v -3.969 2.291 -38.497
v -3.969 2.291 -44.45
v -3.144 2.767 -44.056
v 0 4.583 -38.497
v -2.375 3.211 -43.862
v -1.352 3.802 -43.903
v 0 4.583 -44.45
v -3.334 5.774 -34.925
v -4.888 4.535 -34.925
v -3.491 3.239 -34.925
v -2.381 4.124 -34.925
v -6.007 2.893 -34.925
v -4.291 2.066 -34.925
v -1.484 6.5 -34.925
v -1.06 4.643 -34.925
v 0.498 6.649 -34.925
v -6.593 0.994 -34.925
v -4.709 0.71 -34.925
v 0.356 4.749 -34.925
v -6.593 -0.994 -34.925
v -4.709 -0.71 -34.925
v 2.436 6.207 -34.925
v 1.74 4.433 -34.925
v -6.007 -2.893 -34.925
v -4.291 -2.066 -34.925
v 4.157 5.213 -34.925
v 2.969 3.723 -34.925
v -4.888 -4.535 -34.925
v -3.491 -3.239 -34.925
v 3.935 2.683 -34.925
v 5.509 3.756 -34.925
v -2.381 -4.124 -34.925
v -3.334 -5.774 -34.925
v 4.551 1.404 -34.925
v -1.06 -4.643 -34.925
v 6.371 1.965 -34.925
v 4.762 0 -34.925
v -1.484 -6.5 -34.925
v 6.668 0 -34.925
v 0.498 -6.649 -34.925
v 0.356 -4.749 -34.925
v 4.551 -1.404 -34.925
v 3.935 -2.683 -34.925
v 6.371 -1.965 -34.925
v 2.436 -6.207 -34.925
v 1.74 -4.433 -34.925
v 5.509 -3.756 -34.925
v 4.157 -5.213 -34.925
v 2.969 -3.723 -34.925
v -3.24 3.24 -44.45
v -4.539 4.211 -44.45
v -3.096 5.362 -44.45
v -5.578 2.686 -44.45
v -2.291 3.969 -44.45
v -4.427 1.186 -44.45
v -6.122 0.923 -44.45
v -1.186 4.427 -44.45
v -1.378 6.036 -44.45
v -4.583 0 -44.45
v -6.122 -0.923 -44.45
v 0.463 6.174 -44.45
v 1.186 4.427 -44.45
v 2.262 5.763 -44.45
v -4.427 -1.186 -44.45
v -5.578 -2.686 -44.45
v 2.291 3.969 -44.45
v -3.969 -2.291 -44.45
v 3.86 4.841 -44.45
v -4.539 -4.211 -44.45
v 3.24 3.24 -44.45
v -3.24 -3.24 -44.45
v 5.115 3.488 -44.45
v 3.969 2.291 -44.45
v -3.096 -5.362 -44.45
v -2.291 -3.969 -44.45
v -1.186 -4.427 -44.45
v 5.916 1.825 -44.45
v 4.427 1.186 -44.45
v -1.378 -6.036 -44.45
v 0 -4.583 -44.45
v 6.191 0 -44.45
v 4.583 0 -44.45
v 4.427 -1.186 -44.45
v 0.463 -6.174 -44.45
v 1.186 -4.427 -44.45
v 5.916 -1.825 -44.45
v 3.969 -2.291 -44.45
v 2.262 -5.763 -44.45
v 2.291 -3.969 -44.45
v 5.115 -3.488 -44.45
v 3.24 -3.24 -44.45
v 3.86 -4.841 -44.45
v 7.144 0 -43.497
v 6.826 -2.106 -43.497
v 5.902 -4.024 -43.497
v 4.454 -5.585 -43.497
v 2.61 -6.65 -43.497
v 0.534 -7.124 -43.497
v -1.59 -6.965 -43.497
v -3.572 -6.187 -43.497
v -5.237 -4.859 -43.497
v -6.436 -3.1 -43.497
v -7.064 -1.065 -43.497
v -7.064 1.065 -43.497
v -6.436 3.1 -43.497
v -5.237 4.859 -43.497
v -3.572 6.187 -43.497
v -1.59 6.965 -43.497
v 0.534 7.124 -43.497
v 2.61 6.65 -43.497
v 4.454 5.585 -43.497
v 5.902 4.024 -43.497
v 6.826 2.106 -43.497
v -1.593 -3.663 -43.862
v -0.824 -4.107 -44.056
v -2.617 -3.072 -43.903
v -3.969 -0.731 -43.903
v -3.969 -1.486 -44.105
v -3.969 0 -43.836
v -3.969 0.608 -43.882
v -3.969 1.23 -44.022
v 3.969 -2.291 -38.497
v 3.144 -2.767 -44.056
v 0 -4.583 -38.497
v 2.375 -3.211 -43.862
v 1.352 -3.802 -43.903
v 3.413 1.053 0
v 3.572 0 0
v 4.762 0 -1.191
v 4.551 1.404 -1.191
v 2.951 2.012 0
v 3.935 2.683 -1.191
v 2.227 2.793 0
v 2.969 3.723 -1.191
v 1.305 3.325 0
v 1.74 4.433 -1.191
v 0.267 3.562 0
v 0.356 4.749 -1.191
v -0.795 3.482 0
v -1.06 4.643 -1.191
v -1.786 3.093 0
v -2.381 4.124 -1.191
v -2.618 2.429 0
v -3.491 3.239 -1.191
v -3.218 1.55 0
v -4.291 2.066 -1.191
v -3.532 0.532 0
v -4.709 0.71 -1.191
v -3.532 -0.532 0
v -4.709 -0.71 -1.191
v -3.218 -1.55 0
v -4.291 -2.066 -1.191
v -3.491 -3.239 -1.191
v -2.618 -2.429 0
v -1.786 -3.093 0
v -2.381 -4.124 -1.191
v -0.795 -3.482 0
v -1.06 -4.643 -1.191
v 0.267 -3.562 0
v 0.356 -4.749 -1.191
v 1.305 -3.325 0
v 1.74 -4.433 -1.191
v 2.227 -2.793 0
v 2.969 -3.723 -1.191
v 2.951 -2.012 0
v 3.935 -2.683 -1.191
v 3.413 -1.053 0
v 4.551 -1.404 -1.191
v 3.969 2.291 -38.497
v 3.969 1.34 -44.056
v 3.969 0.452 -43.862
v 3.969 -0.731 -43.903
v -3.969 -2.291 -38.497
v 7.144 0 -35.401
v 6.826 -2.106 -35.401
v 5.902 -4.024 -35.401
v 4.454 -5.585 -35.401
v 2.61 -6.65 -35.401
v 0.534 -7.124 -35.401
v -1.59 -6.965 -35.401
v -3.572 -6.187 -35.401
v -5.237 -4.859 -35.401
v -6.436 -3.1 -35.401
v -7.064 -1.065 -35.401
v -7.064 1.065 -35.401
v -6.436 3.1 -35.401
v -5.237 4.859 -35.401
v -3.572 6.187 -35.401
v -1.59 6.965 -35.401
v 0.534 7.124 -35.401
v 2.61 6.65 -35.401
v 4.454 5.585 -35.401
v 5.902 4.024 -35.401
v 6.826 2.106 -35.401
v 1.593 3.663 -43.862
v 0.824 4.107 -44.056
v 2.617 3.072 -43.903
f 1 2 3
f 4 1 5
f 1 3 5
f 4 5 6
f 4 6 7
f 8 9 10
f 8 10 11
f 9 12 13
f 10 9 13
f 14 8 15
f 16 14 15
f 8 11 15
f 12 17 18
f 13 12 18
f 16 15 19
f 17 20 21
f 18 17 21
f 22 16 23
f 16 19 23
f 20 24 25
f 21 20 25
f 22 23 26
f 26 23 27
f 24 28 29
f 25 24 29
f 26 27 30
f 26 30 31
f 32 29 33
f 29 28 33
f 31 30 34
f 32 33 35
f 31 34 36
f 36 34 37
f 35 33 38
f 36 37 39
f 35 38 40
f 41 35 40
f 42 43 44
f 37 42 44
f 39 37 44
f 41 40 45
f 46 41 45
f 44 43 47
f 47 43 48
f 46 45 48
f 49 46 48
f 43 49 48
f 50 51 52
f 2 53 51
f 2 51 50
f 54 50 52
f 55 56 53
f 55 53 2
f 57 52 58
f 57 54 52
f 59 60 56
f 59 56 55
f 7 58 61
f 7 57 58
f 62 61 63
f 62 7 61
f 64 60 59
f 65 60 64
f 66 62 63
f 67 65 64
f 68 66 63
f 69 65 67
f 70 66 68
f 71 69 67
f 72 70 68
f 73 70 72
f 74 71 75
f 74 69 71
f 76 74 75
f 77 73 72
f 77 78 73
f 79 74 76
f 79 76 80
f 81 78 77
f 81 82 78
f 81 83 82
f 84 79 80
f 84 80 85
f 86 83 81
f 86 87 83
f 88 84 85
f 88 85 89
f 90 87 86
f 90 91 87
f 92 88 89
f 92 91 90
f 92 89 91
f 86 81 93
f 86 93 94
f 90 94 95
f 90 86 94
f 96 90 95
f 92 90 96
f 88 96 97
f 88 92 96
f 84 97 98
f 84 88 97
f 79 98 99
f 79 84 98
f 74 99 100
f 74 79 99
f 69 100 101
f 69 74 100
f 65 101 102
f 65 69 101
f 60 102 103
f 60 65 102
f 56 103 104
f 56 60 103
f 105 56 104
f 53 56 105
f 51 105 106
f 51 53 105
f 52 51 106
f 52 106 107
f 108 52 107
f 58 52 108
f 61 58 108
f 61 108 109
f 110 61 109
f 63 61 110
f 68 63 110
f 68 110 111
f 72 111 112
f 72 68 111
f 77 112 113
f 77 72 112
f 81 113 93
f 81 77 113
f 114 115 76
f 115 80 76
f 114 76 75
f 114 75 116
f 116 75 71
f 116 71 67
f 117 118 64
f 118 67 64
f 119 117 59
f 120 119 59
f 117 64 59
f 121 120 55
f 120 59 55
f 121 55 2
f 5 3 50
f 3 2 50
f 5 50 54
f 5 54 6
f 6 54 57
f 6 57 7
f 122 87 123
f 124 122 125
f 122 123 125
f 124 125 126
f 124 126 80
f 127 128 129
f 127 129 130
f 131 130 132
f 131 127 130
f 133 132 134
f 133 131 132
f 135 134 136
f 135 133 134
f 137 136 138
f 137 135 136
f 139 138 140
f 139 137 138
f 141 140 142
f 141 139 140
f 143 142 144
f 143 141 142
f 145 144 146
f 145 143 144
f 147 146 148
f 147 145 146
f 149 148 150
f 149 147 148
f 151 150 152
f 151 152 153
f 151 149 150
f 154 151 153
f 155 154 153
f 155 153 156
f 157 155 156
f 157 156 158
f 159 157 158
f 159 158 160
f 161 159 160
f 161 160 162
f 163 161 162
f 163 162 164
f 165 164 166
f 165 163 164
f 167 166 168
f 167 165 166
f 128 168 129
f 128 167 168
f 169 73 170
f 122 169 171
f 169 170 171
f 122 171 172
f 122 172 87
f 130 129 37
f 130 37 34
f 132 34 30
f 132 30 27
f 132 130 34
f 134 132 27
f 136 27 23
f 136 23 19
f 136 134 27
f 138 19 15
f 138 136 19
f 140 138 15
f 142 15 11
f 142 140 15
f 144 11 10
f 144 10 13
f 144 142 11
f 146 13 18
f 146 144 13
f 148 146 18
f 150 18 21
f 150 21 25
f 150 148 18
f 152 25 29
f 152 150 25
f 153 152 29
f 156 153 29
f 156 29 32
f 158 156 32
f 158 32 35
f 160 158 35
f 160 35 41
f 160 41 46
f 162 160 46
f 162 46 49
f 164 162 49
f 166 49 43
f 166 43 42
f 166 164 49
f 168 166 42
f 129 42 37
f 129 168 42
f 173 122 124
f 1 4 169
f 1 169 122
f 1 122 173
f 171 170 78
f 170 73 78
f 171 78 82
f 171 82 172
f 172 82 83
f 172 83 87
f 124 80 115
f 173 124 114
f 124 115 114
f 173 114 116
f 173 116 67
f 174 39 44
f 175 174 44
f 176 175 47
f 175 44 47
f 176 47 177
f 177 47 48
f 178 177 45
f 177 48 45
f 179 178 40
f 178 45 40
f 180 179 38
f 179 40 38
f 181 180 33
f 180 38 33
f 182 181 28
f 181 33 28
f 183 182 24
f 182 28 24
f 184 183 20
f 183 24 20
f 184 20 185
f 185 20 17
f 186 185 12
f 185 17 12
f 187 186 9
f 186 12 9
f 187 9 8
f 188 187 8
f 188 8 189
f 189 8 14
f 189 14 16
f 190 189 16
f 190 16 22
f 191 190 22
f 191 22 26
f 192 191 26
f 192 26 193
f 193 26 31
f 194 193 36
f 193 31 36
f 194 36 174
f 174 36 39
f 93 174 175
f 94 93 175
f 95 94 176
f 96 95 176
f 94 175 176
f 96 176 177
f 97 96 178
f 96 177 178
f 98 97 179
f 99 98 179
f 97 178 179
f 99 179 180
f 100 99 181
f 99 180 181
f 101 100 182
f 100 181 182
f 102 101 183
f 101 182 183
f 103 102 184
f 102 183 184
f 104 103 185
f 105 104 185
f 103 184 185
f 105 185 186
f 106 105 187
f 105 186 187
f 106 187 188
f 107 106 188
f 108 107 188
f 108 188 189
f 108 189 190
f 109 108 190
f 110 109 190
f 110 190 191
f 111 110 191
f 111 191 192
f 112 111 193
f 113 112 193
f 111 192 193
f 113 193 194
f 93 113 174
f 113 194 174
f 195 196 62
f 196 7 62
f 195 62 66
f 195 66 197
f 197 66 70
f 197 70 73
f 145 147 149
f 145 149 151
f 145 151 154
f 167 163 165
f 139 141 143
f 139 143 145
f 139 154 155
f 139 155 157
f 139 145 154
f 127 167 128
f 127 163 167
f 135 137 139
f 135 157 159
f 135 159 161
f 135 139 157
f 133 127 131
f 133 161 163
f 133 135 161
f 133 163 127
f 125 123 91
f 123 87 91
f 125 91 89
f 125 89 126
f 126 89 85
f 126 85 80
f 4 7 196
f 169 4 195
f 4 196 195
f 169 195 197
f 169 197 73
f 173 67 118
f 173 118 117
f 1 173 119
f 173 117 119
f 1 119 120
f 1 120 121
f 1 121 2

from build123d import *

# Parameters (mm, degrees)
SKETCH1_R          = 4.7625
EXTRUDE1_DEPTH     = 34.925
SKETCH6_R          = 7.14375
EXTRUDE2_DEPTH     = 9.525
CUT_EXTRUDE1_DEPTH = 5.953125
SKETCH8_R          = 4.582717762
CUT_EXTRUDE2_DEPTH = 0.9525
CUT_EXTRUDE2_DRAFT = -45
CHAMFER1_SIZE      = 0.9525
CHAMFER2_SIZE      = 0.47625
CHAMFER3_SIZE      = 1.190625


with BuildPart() as part:
    # Sketch1 → Extrude1 (new body)
    with BuildSketch(Plane.XY):
        Circle(SKETCH1_R)
    extrude(amount=-EXTRUDE1_DEPTH)

    # Sketch6 → Extrude2 (add)
    with BuildSketch(Plane(origin=(0, 0, -34.925), x_dir=(-1, 0, 0), z_dir=(0, 0, -1))):
        with Locations(Location((0, 0, 0), (0, 0, 180))):
            Circle(SKETCH6_R)
    extrude(amount=EXTRUDE2_DEPTH)

    # Sketch7 → Cut-Extrude1 (cut)
    with BuildSketch(Plane(origin=(0, 0, -44.45), x_dir=(-1, 0, 0), z_dir=(0, 0, -1))):
        Polygon((0, 4.582717762), (-3.96875, 2.291358881), (-3.96875, -2.291358881), (0, -4.582717762), (3.96875, -2.291358881), (3.96875, 2.291358881), align=None)
    extrude(amount=-CUT_EXTRUDE1_DEPTH, mode=Mode.SUBTRACT)


with BuildPart() as cut_extrude2_tool:
    # Sketch8 → Cut-Extrude2 (with draft: the straight prism first)
    with BuildSketch(Plane(origin=(0, 0, -44.45), x_dir=(-1, 0, 0), z_dir=(0, 0, -1))):
        Circle(SKETCH8_R)
    extrude(amount=-CUT_EXTRUDE2_DEPTH)
    # Cut-Extrude2: the draft: its side faces are tilted about the plane it starts from
    cut_extrude2_sides = [cut_extrude2_tool.faces().sort_by_distance(p)[0] for p in [
        (4.582717762, 0, -43.97375),
    ]]
    draft(cut_extrude2_sides, Plane(origin=(0, 0, -44.45), x_dir=(-1, 0, 0), z_dir=(0, 0, -1)), CUT_EXTRUDE2_DRAFT)


with BuildPart() as part_1:
    add(part.part)

    # Cut-Extrude2: cut by cut_extrude2_tool
    add(cut_extrude2_tool.part, mode=Mode.SUBTRACT)

    # Chamfer1
    chamfer1_edges = [part_1.edges().sort_by_distance(p)[0] for p in [
        (-7.14375, 0, -44.45),
    ]]
    chamfer(chamfer1_edges, length=CHAMFER1_SIZE)

    # Chamfer2
    chamfer2_edges = [part_1.edges().sort_by_distance(p)[0] for p in [
        (-7.14375, 0, -34.925),
    ]]
    chamfer(chamfer2_edges, length=CHAMFER2_SIZE)

    # Chamfer3
    chamfer3_edges = [part_1.edges().sort_by_distance(p)[0] for p in [
        (-4.7625, 0, 0),
    ]]
    chamfer(chamfer3_edges, length=CHAMFER3_SIZE)


solid = part_1.part
